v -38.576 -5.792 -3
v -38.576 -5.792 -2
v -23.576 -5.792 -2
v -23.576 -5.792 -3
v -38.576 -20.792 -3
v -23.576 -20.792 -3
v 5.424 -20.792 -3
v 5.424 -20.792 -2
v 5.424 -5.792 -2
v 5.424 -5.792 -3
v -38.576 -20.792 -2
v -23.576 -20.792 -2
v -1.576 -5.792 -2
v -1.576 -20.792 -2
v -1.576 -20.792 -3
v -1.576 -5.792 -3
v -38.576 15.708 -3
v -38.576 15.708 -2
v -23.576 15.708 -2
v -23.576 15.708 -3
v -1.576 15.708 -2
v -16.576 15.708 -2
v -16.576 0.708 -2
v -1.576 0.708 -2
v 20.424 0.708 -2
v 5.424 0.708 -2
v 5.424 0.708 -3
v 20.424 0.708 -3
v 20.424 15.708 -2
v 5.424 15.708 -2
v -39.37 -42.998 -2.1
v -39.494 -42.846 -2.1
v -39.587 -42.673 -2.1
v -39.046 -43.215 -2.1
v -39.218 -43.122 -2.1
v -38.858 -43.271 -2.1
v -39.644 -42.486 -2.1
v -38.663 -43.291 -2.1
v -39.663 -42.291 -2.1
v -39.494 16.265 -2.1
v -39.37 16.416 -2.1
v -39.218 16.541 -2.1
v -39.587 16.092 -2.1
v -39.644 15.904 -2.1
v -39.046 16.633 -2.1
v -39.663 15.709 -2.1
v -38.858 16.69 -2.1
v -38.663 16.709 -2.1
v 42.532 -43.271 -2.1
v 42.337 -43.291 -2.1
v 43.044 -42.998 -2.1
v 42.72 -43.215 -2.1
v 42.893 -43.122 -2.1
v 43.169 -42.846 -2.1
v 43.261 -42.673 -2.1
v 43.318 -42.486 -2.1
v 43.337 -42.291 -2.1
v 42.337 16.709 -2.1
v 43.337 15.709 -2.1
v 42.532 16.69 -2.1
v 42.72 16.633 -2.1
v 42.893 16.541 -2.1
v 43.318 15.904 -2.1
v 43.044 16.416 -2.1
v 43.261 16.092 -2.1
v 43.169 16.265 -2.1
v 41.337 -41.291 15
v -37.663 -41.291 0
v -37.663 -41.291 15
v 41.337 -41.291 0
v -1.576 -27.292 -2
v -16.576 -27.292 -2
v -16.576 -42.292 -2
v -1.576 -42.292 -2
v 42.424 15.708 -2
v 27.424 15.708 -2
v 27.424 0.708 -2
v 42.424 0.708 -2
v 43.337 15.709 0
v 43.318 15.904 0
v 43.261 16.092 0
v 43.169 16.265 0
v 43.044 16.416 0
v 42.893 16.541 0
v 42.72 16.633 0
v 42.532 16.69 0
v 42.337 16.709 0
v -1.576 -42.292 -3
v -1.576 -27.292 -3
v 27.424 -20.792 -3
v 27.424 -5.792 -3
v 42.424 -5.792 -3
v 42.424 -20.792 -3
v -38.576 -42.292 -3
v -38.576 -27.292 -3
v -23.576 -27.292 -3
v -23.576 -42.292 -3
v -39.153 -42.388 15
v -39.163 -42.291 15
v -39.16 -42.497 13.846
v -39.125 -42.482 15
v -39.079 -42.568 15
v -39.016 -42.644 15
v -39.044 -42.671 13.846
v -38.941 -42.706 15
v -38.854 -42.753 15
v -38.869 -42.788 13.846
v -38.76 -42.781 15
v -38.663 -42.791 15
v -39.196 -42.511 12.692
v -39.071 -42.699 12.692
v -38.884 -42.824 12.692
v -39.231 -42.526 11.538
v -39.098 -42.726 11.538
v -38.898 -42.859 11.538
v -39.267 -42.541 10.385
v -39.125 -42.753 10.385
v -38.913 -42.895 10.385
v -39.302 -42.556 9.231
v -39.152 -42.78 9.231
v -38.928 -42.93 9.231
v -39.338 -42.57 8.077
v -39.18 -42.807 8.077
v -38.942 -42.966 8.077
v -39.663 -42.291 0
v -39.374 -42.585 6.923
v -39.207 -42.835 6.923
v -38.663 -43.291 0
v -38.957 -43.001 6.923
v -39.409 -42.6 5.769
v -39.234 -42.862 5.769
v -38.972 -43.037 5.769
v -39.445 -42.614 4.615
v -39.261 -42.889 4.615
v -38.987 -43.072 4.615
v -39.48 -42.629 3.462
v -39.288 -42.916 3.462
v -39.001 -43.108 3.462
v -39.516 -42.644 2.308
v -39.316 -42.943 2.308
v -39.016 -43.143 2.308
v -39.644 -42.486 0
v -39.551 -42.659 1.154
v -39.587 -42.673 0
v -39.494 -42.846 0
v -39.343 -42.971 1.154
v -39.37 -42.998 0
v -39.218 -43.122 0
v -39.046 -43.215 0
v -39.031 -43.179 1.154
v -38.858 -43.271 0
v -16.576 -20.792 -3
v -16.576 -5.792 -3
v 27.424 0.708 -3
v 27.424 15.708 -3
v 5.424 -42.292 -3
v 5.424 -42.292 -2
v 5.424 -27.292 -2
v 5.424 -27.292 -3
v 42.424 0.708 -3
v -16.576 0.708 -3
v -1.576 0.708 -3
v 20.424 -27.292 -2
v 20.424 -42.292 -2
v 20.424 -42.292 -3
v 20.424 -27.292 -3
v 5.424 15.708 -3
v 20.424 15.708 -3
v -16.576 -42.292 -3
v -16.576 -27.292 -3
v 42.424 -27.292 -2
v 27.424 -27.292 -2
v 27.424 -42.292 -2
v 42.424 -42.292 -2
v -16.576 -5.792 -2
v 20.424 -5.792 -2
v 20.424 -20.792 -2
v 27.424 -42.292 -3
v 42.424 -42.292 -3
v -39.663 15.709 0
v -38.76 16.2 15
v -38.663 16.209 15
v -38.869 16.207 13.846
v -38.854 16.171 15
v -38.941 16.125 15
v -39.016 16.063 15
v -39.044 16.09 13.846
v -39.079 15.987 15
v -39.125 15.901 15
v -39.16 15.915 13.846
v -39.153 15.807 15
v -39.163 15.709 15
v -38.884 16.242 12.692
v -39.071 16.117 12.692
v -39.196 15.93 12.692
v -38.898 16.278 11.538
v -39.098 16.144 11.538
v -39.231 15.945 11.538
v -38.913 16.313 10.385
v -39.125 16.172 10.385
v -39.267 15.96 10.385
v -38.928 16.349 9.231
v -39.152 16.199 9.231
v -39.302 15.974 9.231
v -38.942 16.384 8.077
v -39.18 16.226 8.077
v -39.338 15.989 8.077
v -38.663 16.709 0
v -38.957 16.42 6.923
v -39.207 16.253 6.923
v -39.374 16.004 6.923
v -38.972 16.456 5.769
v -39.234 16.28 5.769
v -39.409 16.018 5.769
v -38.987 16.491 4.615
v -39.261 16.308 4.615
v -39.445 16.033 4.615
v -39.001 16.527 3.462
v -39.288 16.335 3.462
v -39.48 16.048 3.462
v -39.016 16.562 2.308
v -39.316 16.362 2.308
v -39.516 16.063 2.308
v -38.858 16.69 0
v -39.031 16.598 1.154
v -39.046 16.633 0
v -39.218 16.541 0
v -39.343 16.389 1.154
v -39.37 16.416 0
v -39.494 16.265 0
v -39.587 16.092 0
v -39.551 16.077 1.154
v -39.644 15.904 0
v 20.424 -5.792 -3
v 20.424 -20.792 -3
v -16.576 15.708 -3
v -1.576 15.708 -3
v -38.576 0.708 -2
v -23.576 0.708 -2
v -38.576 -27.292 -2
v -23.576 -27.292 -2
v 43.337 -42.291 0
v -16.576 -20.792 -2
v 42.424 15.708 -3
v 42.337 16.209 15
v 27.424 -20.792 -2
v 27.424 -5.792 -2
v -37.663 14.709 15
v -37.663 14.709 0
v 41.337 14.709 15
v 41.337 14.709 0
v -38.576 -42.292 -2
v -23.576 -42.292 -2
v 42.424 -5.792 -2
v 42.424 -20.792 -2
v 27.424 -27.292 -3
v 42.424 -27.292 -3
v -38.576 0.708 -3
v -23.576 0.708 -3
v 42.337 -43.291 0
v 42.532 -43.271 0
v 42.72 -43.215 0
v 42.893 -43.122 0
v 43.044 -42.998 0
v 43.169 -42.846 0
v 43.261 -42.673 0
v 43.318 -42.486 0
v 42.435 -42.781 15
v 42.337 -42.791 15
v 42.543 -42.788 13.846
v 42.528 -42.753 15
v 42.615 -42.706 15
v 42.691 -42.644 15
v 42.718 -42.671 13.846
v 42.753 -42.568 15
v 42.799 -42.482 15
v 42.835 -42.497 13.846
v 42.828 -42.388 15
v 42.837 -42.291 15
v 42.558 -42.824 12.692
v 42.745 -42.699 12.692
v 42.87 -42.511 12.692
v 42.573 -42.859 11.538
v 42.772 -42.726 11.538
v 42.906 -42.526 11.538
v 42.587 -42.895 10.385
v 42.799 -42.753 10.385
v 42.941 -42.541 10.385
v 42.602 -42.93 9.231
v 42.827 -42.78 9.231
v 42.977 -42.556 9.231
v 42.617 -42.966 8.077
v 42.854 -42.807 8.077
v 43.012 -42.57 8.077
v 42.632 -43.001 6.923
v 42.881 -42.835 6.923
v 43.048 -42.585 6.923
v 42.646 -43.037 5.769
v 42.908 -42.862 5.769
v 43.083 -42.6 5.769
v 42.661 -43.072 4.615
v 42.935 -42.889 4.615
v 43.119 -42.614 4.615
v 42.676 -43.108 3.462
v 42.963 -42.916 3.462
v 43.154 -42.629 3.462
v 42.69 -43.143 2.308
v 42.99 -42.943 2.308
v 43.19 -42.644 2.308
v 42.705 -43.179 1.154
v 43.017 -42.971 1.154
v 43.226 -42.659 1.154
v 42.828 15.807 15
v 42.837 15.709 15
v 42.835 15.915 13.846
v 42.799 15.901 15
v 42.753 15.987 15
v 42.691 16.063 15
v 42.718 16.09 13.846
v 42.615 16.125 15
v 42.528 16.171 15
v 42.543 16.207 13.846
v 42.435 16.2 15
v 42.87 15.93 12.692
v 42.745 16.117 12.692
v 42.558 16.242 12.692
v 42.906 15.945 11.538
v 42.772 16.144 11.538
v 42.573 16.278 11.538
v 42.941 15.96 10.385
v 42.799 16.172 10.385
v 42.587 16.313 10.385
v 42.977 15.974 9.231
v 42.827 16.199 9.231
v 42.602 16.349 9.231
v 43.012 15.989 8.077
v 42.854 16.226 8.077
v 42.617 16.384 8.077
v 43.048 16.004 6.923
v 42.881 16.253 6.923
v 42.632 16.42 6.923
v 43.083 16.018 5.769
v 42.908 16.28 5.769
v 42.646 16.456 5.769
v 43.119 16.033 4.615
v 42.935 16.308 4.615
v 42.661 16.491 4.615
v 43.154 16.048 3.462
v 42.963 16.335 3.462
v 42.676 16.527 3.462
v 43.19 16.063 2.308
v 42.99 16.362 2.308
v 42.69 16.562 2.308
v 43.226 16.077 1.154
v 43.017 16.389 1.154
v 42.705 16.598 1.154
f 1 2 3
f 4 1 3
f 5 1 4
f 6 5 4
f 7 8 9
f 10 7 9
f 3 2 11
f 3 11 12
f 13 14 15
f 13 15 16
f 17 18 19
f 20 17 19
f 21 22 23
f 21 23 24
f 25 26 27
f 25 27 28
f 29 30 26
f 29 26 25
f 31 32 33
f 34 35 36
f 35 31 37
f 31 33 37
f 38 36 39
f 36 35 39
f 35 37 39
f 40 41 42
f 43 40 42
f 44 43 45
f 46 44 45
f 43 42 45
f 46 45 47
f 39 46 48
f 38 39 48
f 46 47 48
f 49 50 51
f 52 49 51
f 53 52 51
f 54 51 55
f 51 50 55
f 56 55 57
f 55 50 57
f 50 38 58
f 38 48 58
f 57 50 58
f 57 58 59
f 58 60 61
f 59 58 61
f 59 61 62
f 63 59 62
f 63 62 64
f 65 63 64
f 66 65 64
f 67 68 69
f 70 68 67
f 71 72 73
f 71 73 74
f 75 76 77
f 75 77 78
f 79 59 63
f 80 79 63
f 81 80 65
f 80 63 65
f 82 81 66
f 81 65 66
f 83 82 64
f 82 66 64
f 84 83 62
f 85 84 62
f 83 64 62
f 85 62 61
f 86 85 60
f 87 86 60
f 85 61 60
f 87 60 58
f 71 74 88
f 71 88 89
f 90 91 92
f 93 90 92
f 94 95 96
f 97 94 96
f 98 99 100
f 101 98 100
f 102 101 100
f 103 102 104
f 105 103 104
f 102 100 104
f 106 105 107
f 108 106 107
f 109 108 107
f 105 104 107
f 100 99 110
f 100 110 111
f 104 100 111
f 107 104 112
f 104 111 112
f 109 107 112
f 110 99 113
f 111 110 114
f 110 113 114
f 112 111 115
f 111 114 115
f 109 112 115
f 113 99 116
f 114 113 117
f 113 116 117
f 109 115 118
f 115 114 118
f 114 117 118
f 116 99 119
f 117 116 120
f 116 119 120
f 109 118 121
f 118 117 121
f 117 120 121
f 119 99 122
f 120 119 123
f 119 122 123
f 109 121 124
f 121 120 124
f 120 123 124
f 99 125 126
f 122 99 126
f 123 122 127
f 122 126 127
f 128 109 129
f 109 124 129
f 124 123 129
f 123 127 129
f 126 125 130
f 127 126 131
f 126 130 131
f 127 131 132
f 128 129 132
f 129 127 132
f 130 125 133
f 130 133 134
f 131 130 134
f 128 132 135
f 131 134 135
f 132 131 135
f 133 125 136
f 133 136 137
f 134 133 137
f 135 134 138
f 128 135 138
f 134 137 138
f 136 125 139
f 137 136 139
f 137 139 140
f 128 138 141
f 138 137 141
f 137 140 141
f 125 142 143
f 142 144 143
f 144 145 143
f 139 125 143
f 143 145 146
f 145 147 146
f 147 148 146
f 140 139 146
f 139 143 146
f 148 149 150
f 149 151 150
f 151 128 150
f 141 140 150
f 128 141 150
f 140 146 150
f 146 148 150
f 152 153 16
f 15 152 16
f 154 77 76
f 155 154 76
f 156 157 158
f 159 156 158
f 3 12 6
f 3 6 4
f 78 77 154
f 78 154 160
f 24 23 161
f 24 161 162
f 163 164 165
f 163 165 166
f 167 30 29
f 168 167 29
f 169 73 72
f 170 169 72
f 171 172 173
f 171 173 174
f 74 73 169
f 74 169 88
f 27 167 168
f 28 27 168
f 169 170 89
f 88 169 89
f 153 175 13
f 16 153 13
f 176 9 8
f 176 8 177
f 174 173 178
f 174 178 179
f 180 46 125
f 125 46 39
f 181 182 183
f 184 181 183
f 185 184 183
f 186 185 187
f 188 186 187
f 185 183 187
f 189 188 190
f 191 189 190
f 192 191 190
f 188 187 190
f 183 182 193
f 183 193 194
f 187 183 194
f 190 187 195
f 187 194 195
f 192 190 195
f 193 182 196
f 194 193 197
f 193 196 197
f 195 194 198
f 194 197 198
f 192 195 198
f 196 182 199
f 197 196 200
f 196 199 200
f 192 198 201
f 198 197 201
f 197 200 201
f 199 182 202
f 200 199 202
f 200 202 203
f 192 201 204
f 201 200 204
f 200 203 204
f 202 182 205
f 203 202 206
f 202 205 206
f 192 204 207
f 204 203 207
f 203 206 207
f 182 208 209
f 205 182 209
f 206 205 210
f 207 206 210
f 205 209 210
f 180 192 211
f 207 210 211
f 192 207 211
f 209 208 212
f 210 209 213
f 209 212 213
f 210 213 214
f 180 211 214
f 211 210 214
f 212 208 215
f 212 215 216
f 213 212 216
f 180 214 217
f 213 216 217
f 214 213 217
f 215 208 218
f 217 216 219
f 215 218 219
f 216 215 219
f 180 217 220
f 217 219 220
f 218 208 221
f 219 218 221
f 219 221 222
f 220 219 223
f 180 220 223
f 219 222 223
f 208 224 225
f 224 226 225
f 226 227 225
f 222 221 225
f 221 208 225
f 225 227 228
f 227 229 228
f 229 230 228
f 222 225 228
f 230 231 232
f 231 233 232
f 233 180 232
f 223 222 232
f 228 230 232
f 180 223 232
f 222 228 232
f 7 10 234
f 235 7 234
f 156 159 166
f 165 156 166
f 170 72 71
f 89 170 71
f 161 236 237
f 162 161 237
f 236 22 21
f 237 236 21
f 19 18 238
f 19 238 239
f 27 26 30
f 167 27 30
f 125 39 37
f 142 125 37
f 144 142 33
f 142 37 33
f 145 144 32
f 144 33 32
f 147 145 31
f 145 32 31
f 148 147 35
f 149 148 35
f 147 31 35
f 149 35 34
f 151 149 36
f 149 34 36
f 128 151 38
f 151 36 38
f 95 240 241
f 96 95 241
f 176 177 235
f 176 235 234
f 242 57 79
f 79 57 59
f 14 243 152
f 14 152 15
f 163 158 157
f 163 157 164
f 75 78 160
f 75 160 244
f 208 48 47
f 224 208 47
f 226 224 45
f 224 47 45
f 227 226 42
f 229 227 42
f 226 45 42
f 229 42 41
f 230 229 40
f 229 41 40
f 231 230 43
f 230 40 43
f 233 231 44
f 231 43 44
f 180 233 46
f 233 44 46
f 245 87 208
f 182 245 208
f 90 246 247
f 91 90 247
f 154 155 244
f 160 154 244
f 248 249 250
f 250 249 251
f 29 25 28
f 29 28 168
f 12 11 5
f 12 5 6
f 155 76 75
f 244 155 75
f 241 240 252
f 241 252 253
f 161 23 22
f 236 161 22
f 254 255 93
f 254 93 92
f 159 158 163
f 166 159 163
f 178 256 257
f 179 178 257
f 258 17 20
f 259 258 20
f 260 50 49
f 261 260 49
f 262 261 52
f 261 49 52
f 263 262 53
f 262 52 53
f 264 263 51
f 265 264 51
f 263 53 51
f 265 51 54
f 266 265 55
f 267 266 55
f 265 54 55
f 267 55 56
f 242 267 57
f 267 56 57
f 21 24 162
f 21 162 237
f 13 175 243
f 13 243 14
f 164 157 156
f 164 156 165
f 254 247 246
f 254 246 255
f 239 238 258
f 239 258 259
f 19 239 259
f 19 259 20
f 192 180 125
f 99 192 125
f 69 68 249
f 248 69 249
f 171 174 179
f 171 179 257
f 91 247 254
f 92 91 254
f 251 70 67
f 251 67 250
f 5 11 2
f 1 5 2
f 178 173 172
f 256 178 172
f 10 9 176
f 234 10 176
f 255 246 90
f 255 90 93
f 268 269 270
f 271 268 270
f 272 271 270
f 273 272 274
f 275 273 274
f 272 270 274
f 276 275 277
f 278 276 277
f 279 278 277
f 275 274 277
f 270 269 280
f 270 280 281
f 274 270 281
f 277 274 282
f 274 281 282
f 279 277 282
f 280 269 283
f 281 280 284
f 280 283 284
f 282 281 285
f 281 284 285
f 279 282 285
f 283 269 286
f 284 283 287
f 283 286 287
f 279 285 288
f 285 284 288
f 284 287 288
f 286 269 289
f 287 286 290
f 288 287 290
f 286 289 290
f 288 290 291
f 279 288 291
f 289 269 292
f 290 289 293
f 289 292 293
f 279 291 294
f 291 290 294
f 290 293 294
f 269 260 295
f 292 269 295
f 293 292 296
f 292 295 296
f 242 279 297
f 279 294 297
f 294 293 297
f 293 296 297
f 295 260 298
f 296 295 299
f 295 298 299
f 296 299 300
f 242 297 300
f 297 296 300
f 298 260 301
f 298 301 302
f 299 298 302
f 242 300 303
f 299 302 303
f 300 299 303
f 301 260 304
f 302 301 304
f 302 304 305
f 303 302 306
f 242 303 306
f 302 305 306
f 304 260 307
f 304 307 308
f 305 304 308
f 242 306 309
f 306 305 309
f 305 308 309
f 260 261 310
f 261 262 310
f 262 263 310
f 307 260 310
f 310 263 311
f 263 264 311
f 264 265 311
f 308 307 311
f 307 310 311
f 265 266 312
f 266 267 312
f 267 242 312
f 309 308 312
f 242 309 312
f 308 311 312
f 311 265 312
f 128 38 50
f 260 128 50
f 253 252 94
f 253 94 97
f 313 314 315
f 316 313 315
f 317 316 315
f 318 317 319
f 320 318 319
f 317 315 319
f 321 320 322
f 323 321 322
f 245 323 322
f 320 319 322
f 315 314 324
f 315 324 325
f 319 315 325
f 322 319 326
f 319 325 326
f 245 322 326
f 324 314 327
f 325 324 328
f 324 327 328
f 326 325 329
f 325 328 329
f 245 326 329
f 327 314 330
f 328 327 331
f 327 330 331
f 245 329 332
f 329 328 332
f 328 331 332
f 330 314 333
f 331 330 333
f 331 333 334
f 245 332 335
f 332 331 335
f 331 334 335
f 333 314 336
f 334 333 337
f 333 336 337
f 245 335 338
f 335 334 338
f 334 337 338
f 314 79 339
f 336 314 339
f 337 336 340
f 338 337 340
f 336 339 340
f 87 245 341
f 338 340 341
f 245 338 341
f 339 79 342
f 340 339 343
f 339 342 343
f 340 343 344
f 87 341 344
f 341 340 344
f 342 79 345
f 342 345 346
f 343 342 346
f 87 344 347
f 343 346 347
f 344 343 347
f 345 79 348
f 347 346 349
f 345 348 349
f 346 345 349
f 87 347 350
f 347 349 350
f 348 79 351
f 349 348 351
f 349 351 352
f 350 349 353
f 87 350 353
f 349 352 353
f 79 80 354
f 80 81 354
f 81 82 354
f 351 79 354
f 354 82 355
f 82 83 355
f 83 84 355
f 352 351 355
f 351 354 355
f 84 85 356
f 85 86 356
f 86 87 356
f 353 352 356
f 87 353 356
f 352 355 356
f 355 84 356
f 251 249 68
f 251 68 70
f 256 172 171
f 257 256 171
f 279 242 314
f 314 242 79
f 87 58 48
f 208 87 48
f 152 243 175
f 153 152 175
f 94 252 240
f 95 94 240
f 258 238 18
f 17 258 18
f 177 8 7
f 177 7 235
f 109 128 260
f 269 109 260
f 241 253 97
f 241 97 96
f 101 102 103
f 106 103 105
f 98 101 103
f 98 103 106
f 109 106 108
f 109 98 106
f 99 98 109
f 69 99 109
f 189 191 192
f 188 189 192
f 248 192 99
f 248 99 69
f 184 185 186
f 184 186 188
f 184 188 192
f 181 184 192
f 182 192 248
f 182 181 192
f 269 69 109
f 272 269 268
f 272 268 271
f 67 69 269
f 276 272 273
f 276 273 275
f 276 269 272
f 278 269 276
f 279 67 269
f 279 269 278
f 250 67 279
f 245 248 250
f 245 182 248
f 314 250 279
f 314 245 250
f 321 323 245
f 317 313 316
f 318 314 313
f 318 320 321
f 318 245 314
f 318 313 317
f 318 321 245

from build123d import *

# Parameters (mm, degrees)
F2_W     = 15
F2_H     = 15
F3_DEPTH = 1
F0_W     = 79
F0_H     = 56
F4_DEPTH = 2.1
F5_DEPTH = 15
F6_SIZE2 = 15
F6_SIZE  = 0.5


with BuildPart() as f3:
    # F2 (on offset) → F3 (new body)
    with BuildSketch(Plane.XY.offset(-2)):
        with Locations((-31.0763570666, -34.7923475802)):
            Rectangle(F2_W, F2_H)
    extrude(amount=-F3_DEPTH)


with BuildPart() as f3b:
    # F2 (on offset) → F3, piece 2 (new body)
    with BuildSketch(Plane.XY.offset(-2)):
        with Locations((-31.0763570666, -13.2923475802)):
            Rectangle(F2_W, F2_H)
    extrude(amount=-F3_DEPTH)


with BuildPart() as f3c:
    # F2 (on offset) → F3, piece 3 (new body)
    with BuildSketch(Plane.XY.offset(-2)):
        with Locations((-31.0763570666, 8.2076524198)):
            Rectangle(F2_W, F2_H)
    extrude(amount=-F3_DEPTH)


with BuildPart() as f3d:
    # F2 (on offset) → F3, piece 4 (new body)
    with BuildSketch(Plane.XY.offset(-2)):
        with Locations((-9.0763570666, -34.7923475802)):
            Rectangle(F2_W, F2_H)
    extrude(amount=-F3_DEPTH)


with BuildPart() as f3e:
    # F2 (on offset) → F3, piece 5 (new body)
    with BuildSketch(Plane.XY.offset(-2)):
        with Locations((-9.0763570666, -13.2923475802)):
            Rectangle(F2_W, F2_H)
    extrude(amount=-F3_DEPTH)


with BuildPart() as f3f:
    # F2 (on offset) → F3, piece 6 (new body)
    with BuildSketch(Plane.XY.offset(-2)):
        with Locations((-9.0763570666, 8.2076524198)):
            Rectangle(F2_W, F2_H)
    extrude(amount=-F3_DEPTH)


with BuildPart() as f3g:
    # F2 (on offset) → F3, piece 7 (new body)
    with BuildSketch(Plane.XY.offset(-2)):
        with Locations((12.9236429334, -34.7923475802)):
            Rectangle(F2_W, F2_H)
    extrude(amount=-F3_DEPTH)


with BuildPart() as f3h:
    # F2 (on offset) → F3, piece 8 (new body)
    with BuildSketch(Plane.XY.offset(-2)):
        with Locations((12.9236429334, -13.2923475802)):
            Rectangle(F2_W, F2_H)
    extrude(amount=-F3_DEPTH)


with BuildPart() as f3i:
    # F2 (on offset) → F3, piece 9 (new body)
    with BuildSketch(Plane.XY.offset(-2)):
        with Locations((12.9236429334, 8.2076524198)):
            Rectangle(F2_W, F2_H)
    extrude(amount=-F3_DEPTH)


with BuildPart() as f3j:
    # F2 (on offset) → F3, piece 10 (new body)
    with BuildSketch(Plane.XY.offset(-2)):
        with Locations((34.9236429334, -34.7923475802)):
            Rectangle(F2_W, F2_H)
    extrude(amount=-F3_DEPTH)


with BuildPart() as f3k:
    # F2 (on offset) → F3, piece 11 (new body)
    with BuildSketch(Plane.XY.offset(-2)):
        with Locations((34.9236429334, -13.2923475802)):
            Rectangle(F2_W, F2_H)
    extrude(amount=-F3_DEPTH)


with BuildPart() as f3l:
    # F2 (on offset) → F3, piece 12 (new body)
    with BuildSketch(Plane.XY.offset(-2)):
        with Locations((34.9236429334, 8.2076524198)):
            Rectangle(F2_W, F2_H)
    extrude(amount=-F3_DEPTH)


with BuildPart() as f4:
    # F0 (on Top) → F4 (new body)
    with BuildSketch(Plane.XY):
        with BuildLine():
            Line((42.3371575624, 16.709325991), (-38.6628424376, 16.709325991))
            ThreePointArc((-38.6628424376, 16.709325991), (-39.3699492188, 16.4164327722), (-39.6628424376, 15.709325991))
            Line((-39.6628424376, 15.709325991), (-39.6628424376, -42.290674009))
            ThreePointArc((-39.6628424376, -42.290674009), (-39.3699492188, -42.9977807901), (-38.6628424376, -43.290674009))
            Line((-38.6628424376, -43.290674009), (42.3371575624, -43.290674009))
            ThreePointArc((42.3371575624, -43.290674009), (43.0442643436, -42.9977807901), (43.3371575624, -42.290674009))
            Line((43.3371575624, -42.290674009), (43.3371575624, 15.709325991))
            ThreePointArc((43.3371575624, 15.709325991), (43.0442643436, 16.4164327722), (42.3371575624, 16.709325991))
        make_face()
        with Locations((1.8371575624, -13.290674009)):
            Rectangle(F0_W, F0_H, mode=Mode.SUBTRACT)
        with Locations((1.8371575624, -13.290674009)):
            Rectangle(F0_W, F0_H)
    extrude(amount=-F4_DEPTH)

    # F0 (on Top) → F5 (join)
    with BuildSketch(Plane.XY):
        with BuildLine():
            Line((42.3371575624, 16.709325991), (-38.6628424376, 16.709325991))
            ThreePointArc((-38.6628424376, 16.709325991), (-39.3699492188, 16.4164327722), (-39.6628424376, 15.709325991))
            Line((-39.6628424376, 15.709325991), (-39.6628424376, -42.290674009))
            ThreePointArc((-39.6628424376, -42.290674009), (-39.3699492188, -42.9977807901), (-38.6628424376, -43.290674009))
            Line((-38.6628424376, -43.290674009), (42.3371575624, -43.290674009))
            ThreePointArc((42.3371575624, -43.290674009), (43.0442643436, -42.9977807901), (43.3371575624, -42.290674009))
            Line((43.3371575624, -42.290674009), (43.3371575624, 15.709325991))
            ThreePointArc((43.3371575624, 15.709325991), (43.0442643436, 16.4164327722), (42.3371575624, 16.709325991))
        make_face()
        with Locations((1.8371575624, -13.290674009)):
            Rectangle(F0_W, F0_H, mode=Mode.SUBTRACT)
    extrude(amount=F5_DEPTH)

    # F6
    f6_edges = [f4.edges().sort_by_distance(p)[0] for p in [
        (43.337158, -13.290674, 15),
    ]]
    f6_side = f4.faces().sort_by_distance((42.312999, -13.290674, 15))[0]
    chamfer(f6_edges, length=F6_SIZE, length2=F6_SIZE2, reference=f6_side)


solid = Compound([f3.part, f3b.part, f3c.part, f3d.part, f3e.part, f3f.part, f3g.part, f3h.part, f3i.part, f3j.part, f3k.part, f3l.part, f4.part])
